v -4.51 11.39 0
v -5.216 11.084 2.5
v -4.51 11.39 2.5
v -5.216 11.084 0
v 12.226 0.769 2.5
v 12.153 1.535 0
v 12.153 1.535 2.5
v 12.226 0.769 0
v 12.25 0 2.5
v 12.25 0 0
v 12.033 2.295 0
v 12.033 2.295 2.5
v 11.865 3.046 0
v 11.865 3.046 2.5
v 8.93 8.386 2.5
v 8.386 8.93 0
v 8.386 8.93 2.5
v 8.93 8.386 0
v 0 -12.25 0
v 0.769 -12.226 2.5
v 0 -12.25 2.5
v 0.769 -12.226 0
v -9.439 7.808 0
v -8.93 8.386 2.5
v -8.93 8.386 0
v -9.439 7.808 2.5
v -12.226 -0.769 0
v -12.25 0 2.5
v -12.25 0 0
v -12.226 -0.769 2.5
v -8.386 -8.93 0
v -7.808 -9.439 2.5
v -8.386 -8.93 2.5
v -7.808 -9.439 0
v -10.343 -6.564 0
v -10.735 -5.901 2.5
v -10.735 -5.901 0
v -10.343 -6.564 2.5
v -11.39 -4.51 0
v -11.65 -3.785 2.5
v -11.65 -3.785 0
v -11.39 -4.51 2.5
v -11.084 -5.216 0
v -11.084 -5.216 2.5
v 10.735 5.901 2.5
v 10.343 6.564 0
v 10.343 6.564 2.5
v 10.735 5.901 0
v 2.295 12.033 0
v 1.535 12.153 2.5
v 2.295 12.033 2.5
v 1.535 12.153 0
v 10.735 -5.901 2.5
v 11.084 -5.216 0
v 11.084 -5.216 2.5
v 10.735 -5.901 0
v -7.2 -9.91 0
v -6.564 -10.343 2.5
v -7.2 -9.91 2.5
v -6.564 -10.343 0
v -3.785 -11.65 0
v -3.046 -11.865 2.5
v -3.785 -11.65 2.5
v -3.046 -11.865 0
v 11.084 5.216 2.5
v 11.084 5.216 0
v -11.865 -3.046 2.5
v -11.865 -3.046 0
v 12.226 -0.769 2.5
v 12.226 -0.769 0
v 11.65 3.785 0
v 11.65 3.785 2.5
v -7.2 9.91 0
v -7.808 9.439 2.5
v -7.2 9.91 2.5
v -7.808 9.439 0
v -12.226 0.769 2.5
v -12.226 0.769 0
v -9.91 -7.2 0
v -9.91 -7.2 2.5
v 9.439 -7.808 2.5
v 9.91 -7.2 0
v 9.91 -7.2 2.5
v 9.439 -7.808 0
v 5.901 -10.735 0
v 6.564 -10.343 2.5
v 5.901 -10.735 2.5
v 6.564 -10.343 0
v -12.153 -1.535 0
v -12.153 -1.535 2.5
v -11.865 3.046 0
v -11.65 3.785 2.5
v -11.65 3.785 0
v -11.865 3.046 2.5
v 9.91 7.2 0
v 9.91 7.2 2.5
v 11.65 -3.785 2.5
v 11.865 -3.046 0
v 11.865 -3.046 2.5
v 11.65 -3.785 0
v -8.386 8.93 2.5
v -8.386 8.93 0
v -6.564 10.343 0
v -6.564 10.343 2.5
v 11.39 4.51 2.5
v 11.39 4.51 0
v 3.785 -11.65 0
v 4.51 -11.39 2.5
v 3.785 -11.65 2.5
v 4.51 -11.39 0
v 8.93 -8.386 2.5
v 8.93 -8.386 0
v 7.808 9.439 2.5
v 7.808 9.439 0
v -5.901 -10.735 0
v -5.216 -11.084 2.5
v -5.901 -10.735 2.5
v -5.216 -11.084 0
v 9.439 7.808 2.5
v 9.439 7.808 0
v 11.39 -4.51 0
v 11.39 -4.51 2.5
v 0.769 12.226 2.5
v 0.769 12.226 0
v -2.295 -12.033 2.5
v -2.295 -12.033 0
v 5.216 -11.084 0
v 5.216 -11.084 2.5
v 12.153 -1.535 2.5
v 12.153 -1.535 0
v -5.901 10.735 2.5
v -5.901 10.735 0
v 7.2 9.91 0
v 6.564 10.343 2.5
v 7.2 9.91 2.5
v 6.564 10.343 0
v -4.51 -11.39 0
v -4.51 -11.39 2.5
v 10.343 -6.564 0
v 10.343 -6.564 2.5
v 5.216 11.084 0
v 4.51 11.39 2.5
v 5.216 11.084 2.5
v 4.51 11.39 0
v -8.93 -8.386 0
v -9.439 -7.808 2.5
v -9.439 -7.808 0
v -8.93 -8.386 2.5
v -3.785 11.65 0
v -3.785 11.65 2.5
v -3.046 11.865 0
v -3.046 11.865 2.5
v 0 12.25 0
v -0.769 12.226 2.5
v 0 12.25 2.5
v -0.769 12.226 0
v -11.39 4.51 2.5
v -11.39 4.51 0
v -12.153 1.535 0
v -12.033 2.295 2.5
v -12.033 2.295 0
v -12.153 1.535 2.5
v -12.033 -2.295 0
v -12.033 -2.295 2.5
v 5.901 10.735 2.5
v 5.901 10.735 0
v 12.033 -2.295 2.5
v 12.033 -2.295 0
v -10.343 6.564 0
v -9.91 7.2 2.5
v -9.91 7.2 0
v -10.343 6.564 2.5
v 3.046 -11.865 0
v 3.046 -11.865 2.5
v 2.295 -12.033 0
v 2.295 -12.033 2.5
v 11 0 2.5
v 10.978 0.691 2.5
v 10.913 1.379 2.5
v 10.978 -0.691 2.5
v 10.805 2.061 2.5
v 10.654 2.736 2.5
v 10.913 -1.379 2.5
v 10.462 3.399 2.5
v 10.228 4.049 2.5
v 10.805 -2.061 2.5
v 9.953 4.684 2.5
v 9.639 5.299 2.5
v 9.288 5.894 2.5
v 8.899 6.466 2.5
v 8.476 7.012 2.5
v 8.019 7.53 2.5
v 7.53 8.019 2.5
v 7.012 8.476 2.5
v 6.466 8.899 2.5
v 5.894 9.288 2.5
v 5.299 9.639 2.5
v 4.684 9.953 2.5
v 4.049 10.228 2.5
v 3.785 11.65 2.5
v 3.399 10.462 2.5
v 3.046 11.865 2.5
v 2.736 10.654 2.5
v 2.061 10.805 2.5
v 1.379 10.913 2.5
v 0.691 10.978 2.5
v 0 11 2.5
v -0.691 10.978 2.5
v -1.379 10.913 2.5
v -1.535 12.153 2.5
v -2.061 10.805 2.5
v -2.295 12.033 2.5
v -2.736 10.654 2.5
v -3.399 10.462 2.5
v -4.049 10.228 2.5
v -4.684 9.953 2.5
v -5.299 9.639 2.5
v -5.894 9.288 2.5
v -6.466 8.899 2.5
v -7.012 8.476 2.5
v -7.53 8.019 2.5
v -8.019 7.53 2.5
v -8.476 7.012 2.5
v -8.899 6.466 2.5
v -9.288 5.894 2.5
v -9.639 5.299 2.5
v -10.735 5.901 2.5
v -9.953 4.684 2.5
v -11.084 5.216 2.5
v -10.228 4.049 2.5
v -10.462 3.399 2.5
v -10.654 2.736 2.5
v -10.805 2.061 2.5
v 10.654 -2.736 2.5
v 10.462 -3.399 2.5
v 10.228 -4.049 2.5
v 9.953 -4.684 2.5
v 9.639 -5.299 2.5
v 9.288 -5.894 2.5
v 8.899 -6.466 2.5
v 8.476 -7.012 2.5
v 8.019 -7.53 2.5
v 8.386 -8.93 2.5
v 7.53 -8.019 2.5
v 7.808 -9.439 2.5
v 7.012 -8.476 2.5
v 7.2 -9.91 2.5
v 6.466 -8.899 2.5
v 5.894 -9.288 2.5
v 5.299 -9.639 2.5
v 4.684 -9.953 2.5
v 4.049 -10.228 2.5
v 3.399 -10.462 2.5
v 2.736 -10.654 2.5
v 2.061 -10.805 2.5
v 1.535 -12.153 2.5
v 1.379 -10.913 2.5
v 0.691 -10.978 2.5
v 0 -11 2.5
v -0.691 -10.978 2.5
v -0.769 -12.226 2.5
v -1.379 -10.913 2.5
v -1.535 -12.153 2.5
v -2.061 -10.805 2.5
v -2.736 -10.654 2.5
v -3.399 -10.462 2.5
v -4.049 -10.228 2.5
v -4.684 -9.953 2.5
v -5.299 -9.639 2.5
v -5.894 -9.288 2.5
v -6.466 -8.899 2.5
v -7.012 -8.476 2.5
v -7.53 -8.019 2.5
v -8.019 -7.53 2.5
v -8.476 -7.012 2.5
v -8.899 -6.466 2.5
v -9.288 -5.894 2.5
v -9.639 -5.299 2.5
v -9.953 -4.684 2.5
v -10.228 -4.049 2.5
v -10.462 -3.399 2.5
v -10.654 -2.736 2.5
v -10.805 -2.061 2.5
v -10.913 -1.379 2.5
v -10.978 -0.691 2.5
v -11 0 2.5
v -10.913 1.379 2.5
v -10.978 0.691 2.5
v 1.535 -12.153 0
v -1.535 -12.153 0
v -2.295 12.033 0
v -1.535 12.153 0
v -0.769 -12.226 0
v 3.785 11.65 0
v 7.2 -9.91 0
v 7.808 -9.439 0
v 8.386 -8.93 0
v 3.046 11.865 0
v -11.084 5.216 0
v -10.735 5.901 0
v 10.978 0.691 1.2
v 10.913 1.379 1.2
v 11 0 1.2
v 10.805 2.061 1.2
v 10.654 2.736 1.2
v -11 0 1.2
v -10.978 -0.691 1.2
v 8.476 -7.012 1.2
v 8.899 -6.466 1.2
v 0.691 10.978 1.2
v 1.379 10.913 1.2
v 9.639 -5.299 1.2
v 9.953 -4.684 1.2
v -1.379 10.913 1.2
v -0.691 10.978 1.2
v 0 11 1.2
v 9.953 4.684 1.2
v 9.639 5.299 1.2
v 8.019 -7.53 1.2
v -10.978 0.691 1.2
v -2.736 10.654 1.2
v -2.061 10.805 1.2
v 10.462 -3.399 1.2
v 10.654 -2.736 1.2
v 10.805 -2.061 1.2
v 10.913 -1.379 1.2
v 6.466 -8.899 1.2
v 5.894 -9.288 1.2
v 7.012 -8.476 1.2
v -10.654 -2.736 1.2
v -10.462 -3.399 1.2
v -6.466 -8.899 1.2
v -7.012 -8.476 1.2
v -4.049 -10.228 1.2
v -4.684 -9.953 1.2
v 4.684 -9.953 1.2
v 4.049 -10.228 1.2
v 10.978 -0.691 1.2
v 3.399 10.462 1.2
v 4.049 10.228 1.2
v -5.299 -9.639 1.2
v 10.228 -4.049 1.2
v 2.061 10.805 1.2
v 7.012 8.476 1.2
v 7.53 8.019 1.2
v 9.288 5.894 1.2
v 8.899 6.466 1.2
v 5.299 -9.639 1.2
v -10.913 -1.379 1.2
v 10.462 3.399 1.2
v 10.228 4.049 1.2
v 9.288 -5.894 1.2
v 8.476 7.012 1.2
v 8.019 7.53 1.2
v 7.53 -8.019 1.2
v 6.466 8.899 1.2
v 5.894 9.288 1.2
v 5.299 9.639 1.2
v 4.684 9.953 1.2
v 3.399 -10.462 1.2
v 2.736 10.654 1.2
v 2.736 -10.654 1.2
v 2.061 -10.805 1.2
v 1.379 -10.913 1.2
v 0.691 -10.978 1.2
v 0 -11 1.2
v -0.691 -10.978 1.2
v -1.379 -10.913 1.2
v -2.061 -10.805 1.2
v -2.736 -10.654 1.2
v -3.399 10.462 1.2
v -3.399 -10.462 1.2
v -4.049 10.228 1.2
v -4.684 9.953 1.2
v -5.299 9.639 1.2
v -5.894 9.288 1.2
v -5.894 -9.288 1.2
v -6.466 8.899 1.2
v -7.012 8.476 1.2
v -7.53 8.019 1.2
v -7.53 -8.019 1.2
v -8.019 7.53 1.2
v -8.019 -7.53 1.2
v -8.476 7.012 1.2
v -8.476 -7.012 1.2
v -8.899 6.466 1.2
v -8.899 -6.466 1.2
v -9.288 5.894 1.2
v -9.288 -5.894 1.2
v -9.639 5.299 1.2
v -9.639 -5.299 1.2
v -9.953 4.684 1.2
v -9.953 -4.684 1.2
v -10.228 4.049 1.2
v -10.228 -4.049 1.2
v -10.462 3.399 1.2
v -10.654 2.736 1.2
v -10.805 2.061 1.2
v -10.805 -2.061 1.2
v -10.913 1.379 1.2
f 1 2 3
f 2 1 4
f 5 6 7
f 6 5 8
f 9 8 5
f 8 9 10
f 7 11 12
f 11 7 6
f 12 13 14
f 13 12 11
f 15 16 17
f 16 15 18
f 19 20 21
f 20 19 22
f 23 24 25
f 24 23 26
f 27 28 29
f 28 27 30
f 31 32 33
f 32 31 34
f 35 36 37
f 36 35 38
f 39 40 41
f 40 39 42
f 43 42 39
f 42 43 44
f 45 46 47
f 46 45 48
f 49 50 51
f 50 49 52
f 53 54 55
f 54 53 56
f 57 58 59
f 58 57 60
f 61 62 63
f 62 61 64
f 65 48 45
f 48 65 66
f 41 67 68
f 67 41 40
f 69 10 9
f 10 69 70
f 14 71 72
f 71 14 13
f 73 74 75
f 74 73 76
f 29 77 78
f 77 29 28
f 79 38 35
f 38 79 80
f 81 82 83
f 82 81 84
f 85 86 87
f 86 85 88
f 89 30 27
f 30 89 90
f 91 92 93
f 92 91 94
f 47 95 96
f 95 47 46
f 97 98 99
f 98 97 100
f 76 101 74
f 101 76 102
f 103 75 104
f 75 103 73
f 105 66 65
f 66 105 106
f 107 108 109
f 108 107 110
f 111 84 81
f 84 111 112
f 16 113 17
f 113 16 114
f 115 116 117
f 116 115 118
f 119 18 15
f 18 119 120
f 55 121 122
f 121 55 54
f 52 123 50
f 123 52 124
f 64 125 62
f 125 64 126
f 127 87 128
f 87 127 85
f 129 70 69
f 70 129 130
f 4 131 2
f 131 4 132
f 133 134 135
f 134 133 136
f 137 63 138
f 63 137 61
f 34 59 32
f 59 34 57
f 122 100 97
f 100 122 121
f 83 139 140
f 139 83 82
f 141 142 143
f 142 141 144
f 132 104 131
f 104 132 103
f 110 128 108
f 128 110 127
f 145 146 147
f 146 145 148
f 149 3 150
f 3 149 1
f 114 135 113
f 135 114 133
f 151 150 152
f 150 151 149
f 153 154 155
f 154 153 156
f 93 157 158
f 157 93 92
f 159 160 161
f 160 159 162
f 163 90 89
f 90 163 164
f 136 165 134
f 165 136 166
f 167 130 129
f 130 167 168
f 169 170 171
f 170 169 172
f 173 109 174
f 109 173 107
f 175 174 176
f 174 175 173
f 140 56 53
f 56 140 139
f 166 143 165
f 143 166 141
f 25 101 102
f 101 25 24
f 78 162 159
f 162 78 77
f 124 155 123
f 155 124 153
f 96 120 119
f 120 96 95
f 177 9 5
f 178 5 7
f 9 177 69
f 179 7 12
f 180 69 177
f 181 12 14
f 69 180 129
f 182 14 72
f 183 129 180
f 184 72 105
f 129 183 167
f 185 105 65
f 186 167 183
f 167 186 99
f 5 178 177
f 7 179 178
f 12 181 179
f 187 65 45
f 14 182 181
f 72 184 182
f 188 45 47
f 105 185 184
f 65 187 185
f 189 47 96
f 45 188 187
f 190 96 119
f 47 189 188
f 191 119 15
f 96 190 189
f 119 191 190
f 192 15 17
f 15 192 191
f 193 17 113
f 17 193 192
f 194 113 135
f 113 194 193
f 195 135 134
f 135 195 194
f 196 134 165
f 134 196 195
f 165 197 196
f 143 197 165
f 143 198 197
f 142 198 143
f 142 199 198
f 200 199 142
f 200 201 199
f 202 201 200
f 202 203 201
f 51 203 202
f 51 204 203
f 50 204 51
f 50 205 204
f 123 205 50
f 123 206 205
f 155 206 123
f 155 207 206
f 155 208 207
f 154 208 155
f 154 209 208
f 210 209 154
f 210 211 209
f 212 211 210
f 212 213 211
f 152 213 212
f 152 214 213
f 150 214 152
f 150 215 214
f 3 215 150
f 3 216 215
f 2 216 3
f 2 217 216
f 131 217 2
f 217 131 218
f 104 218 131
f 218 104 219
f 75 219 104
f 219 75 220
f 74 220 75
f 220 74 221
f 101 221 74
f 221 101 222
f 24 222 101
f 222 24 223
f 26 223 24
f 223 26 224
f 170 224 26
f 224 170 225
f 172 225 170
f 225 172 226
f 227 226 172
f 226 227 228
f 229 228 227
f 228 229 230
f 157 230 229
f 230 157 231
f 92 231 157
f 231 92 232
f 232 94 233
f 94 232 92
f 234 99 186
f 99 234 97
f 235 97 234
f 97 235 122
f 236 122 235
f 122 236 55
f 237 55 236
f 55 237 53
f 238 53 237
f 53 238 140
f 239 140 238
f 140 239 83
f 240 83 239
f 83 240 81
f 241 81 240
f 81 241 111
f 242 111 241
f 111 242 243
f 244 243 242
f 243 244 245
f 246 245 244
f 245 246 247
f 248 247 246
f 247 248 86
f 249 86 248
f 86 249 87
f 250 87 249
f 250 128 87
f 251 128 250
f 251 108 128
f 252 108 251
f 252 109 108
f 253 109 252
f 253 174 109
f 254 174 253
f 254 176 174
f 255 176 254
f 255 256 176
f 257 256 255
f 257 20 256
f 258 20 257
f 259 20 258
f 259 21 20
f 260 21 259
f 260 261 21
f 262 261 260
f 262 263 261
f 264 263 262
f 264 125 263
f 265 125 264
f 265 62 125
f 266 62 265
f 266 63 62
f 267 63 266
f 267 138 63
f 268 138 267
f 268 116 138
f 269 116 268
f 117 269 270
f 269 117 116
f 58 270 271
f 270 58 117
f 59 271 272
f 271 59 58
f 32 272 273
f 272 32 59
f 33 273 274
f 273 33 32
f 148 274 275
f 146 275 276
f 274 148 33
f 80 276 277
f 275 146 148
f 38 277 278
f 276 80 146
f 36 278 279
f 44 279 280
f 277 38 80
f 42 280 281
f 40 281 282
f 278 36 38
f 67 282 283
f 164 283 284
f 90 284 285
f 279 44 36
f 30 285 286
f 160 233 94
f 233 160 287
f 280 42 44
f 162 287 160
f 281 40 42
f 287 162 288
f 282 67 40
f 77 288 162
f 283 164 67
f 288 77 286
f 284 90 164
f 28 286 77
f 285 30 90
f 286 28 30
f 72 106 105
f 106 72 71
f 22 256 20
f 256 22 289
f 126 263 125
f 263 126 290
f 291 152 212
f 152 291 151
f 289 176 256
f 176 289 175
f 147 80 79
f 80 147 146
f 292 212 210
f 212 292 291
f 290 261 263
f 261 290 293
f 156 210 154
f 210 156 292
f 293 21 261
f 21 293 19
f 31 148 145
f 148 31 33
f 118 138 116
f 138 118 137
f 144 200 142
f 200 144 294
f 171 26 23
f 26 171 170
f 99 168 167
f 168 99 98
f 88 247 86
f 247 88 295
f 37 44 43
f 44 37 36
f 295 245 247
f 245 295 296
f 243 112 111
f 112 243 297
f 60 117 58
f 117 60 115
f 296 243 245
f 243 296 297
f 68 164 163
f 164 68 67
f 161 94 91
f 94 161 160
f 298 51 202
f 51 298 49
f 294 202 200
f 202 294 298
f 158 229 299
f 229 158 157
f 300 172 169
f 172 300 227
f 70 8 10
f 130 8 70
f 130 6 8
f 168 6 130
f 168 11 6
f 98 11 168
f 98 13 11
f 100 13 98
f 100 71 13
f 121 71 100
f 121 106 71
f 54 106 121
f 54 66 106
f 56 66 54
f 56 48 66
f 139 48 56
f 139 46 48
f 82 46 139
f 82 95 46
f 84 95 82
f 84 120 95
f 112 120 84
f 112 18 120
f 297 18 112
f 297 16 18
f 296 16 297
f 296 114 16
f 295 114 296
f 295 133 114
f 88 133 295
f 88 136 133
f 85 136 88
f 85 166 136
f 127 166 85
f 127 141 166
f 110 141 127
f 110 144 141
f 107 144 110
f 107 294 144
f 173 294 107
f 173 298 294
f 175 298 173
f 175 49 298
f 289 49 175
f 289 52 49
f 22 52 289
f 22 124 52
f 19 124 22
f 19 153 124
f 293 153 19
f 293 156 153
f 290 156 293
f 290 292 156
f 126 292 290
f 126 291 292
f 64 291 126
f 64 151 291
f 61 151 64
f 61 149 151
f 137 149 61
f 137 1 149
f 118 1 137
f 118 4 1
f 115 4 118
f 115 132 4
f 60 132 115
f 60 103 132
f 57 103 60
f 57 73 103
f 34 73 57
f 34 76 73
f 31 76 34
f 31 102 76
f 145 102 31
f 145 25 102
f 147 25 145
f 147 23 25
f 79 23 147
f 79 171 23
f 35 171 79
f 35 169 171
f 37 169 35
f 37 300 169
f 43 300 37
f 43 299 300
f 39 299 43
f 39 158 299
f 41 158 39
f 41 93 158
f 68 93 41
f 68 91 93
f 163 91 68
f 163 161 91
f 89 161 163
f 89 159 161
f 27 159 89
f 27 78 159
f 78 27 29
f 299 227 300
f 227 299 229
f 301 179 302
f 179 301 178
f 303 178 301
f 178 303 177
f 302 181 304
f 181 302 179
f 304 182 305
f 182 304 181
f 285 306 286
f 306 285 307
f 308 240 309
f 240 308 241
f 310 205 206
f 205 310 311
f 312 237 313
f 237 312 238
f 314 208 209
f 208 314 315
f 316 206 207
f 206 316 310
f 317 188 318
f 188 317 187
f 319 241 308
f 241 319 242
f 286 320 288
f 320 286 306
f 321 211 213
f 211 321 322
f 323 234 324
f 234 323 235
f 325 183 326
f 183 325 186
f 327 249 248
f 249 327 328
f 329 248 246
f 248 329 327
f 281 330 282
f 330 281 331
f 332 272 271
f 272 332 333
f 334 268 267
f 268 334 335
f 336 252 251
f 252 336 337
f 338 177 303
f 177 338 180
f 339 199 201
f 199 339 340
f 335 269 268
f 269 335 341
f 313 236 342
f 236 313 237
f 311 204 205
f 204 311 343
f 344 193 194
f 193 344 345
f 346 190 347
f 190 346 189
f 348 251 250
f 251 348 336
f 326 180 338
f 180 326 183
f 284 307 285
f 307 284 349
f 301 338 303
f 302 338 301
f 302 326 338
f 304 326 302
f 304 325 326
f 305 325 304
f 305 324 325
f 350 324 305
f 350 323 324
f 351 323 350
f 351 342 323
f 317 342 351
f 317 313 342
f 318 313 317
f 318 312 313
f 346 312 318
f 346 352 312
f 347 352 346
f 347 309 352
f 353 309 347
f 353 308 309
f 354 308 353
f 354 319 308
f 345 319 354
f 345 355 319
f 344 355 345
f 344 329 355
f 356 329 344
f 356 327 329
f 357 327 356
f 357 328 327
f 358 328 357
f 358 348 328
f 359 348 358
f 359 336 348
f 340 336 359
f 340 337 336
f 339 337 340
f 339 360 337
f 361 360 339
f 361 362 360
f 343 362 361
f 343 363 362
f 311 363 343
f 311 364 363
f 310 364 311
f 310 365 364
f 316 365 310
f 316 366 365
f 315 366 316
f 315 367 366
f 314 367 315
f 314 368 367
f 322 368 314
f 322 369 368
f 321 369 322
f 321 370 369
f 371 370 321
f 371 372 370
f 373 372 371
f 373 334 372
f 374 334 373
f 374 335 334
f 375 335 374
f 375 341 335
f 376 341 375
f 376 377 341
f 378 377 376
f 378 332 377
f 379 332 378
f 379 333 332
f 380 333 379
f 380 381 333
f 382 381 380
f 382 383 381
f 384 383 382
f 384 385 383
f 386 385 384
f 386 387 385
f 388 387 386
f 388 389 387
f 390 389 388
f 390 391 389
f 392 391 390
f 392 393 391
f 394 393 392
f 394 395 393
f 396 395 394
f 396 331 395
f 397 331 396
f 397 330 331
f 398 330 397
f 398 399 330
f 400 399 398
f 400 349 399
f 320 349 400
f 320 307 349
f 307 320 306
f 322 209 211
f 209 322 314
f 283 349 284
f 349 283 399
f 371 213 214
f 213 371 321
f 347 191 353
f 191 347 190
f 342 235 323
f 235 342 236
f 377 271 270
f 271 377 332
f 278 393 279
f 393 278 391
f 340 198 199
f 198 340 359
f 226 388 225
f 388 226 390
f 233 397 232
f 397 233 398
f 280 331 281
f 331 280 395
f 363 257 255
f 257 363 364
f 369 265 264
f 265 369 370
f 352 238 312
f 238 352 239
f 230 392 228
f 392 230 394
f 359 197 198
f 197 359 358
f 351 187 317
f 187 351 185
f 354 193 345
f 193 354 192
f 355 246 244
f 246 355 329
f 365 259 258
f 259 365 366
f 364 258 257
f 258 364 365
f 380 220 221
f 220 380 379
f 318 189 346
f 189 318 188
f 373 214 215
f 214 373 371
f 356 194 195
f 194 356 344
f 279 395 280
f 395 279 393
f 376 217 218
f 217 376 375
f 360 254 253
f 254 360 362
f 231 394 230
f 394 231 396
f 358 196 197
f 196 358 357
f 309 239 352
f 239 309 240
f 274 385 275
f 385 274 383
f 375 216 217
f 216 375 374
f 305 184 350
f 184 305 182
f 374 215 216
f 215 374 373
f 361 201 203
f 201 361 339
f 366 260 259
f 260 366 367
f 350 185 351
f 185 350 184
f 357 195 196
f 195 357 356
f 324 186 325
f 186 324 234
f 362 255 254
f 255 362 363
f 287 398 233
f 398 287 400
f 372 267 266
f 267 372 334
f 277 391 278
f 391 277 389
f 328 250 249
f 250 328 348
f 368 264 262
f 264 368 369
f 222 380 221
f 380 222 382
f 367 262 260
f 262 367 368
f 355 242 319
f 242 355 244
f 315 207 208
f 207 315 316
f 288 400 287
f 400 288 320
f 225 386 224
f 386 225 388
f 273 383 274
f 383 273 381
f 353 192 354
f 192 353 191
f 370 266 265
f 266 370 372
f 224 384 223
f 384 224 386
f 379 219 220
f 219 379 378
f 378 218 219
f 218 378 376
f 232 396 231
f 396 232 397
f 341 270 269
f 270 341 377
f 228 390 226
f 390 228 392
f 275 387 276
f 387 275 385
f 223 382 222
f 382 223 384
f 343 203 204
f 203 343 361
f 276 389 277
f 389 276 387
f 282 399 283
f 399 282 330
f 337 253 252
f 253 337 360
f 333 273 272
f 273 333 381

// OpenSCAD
$fn=100;

difference(){
    cylinder(d=24.5,h=2.5);
    translate([0,0,1.2])
        cylinder(d=22,h=2);
}
